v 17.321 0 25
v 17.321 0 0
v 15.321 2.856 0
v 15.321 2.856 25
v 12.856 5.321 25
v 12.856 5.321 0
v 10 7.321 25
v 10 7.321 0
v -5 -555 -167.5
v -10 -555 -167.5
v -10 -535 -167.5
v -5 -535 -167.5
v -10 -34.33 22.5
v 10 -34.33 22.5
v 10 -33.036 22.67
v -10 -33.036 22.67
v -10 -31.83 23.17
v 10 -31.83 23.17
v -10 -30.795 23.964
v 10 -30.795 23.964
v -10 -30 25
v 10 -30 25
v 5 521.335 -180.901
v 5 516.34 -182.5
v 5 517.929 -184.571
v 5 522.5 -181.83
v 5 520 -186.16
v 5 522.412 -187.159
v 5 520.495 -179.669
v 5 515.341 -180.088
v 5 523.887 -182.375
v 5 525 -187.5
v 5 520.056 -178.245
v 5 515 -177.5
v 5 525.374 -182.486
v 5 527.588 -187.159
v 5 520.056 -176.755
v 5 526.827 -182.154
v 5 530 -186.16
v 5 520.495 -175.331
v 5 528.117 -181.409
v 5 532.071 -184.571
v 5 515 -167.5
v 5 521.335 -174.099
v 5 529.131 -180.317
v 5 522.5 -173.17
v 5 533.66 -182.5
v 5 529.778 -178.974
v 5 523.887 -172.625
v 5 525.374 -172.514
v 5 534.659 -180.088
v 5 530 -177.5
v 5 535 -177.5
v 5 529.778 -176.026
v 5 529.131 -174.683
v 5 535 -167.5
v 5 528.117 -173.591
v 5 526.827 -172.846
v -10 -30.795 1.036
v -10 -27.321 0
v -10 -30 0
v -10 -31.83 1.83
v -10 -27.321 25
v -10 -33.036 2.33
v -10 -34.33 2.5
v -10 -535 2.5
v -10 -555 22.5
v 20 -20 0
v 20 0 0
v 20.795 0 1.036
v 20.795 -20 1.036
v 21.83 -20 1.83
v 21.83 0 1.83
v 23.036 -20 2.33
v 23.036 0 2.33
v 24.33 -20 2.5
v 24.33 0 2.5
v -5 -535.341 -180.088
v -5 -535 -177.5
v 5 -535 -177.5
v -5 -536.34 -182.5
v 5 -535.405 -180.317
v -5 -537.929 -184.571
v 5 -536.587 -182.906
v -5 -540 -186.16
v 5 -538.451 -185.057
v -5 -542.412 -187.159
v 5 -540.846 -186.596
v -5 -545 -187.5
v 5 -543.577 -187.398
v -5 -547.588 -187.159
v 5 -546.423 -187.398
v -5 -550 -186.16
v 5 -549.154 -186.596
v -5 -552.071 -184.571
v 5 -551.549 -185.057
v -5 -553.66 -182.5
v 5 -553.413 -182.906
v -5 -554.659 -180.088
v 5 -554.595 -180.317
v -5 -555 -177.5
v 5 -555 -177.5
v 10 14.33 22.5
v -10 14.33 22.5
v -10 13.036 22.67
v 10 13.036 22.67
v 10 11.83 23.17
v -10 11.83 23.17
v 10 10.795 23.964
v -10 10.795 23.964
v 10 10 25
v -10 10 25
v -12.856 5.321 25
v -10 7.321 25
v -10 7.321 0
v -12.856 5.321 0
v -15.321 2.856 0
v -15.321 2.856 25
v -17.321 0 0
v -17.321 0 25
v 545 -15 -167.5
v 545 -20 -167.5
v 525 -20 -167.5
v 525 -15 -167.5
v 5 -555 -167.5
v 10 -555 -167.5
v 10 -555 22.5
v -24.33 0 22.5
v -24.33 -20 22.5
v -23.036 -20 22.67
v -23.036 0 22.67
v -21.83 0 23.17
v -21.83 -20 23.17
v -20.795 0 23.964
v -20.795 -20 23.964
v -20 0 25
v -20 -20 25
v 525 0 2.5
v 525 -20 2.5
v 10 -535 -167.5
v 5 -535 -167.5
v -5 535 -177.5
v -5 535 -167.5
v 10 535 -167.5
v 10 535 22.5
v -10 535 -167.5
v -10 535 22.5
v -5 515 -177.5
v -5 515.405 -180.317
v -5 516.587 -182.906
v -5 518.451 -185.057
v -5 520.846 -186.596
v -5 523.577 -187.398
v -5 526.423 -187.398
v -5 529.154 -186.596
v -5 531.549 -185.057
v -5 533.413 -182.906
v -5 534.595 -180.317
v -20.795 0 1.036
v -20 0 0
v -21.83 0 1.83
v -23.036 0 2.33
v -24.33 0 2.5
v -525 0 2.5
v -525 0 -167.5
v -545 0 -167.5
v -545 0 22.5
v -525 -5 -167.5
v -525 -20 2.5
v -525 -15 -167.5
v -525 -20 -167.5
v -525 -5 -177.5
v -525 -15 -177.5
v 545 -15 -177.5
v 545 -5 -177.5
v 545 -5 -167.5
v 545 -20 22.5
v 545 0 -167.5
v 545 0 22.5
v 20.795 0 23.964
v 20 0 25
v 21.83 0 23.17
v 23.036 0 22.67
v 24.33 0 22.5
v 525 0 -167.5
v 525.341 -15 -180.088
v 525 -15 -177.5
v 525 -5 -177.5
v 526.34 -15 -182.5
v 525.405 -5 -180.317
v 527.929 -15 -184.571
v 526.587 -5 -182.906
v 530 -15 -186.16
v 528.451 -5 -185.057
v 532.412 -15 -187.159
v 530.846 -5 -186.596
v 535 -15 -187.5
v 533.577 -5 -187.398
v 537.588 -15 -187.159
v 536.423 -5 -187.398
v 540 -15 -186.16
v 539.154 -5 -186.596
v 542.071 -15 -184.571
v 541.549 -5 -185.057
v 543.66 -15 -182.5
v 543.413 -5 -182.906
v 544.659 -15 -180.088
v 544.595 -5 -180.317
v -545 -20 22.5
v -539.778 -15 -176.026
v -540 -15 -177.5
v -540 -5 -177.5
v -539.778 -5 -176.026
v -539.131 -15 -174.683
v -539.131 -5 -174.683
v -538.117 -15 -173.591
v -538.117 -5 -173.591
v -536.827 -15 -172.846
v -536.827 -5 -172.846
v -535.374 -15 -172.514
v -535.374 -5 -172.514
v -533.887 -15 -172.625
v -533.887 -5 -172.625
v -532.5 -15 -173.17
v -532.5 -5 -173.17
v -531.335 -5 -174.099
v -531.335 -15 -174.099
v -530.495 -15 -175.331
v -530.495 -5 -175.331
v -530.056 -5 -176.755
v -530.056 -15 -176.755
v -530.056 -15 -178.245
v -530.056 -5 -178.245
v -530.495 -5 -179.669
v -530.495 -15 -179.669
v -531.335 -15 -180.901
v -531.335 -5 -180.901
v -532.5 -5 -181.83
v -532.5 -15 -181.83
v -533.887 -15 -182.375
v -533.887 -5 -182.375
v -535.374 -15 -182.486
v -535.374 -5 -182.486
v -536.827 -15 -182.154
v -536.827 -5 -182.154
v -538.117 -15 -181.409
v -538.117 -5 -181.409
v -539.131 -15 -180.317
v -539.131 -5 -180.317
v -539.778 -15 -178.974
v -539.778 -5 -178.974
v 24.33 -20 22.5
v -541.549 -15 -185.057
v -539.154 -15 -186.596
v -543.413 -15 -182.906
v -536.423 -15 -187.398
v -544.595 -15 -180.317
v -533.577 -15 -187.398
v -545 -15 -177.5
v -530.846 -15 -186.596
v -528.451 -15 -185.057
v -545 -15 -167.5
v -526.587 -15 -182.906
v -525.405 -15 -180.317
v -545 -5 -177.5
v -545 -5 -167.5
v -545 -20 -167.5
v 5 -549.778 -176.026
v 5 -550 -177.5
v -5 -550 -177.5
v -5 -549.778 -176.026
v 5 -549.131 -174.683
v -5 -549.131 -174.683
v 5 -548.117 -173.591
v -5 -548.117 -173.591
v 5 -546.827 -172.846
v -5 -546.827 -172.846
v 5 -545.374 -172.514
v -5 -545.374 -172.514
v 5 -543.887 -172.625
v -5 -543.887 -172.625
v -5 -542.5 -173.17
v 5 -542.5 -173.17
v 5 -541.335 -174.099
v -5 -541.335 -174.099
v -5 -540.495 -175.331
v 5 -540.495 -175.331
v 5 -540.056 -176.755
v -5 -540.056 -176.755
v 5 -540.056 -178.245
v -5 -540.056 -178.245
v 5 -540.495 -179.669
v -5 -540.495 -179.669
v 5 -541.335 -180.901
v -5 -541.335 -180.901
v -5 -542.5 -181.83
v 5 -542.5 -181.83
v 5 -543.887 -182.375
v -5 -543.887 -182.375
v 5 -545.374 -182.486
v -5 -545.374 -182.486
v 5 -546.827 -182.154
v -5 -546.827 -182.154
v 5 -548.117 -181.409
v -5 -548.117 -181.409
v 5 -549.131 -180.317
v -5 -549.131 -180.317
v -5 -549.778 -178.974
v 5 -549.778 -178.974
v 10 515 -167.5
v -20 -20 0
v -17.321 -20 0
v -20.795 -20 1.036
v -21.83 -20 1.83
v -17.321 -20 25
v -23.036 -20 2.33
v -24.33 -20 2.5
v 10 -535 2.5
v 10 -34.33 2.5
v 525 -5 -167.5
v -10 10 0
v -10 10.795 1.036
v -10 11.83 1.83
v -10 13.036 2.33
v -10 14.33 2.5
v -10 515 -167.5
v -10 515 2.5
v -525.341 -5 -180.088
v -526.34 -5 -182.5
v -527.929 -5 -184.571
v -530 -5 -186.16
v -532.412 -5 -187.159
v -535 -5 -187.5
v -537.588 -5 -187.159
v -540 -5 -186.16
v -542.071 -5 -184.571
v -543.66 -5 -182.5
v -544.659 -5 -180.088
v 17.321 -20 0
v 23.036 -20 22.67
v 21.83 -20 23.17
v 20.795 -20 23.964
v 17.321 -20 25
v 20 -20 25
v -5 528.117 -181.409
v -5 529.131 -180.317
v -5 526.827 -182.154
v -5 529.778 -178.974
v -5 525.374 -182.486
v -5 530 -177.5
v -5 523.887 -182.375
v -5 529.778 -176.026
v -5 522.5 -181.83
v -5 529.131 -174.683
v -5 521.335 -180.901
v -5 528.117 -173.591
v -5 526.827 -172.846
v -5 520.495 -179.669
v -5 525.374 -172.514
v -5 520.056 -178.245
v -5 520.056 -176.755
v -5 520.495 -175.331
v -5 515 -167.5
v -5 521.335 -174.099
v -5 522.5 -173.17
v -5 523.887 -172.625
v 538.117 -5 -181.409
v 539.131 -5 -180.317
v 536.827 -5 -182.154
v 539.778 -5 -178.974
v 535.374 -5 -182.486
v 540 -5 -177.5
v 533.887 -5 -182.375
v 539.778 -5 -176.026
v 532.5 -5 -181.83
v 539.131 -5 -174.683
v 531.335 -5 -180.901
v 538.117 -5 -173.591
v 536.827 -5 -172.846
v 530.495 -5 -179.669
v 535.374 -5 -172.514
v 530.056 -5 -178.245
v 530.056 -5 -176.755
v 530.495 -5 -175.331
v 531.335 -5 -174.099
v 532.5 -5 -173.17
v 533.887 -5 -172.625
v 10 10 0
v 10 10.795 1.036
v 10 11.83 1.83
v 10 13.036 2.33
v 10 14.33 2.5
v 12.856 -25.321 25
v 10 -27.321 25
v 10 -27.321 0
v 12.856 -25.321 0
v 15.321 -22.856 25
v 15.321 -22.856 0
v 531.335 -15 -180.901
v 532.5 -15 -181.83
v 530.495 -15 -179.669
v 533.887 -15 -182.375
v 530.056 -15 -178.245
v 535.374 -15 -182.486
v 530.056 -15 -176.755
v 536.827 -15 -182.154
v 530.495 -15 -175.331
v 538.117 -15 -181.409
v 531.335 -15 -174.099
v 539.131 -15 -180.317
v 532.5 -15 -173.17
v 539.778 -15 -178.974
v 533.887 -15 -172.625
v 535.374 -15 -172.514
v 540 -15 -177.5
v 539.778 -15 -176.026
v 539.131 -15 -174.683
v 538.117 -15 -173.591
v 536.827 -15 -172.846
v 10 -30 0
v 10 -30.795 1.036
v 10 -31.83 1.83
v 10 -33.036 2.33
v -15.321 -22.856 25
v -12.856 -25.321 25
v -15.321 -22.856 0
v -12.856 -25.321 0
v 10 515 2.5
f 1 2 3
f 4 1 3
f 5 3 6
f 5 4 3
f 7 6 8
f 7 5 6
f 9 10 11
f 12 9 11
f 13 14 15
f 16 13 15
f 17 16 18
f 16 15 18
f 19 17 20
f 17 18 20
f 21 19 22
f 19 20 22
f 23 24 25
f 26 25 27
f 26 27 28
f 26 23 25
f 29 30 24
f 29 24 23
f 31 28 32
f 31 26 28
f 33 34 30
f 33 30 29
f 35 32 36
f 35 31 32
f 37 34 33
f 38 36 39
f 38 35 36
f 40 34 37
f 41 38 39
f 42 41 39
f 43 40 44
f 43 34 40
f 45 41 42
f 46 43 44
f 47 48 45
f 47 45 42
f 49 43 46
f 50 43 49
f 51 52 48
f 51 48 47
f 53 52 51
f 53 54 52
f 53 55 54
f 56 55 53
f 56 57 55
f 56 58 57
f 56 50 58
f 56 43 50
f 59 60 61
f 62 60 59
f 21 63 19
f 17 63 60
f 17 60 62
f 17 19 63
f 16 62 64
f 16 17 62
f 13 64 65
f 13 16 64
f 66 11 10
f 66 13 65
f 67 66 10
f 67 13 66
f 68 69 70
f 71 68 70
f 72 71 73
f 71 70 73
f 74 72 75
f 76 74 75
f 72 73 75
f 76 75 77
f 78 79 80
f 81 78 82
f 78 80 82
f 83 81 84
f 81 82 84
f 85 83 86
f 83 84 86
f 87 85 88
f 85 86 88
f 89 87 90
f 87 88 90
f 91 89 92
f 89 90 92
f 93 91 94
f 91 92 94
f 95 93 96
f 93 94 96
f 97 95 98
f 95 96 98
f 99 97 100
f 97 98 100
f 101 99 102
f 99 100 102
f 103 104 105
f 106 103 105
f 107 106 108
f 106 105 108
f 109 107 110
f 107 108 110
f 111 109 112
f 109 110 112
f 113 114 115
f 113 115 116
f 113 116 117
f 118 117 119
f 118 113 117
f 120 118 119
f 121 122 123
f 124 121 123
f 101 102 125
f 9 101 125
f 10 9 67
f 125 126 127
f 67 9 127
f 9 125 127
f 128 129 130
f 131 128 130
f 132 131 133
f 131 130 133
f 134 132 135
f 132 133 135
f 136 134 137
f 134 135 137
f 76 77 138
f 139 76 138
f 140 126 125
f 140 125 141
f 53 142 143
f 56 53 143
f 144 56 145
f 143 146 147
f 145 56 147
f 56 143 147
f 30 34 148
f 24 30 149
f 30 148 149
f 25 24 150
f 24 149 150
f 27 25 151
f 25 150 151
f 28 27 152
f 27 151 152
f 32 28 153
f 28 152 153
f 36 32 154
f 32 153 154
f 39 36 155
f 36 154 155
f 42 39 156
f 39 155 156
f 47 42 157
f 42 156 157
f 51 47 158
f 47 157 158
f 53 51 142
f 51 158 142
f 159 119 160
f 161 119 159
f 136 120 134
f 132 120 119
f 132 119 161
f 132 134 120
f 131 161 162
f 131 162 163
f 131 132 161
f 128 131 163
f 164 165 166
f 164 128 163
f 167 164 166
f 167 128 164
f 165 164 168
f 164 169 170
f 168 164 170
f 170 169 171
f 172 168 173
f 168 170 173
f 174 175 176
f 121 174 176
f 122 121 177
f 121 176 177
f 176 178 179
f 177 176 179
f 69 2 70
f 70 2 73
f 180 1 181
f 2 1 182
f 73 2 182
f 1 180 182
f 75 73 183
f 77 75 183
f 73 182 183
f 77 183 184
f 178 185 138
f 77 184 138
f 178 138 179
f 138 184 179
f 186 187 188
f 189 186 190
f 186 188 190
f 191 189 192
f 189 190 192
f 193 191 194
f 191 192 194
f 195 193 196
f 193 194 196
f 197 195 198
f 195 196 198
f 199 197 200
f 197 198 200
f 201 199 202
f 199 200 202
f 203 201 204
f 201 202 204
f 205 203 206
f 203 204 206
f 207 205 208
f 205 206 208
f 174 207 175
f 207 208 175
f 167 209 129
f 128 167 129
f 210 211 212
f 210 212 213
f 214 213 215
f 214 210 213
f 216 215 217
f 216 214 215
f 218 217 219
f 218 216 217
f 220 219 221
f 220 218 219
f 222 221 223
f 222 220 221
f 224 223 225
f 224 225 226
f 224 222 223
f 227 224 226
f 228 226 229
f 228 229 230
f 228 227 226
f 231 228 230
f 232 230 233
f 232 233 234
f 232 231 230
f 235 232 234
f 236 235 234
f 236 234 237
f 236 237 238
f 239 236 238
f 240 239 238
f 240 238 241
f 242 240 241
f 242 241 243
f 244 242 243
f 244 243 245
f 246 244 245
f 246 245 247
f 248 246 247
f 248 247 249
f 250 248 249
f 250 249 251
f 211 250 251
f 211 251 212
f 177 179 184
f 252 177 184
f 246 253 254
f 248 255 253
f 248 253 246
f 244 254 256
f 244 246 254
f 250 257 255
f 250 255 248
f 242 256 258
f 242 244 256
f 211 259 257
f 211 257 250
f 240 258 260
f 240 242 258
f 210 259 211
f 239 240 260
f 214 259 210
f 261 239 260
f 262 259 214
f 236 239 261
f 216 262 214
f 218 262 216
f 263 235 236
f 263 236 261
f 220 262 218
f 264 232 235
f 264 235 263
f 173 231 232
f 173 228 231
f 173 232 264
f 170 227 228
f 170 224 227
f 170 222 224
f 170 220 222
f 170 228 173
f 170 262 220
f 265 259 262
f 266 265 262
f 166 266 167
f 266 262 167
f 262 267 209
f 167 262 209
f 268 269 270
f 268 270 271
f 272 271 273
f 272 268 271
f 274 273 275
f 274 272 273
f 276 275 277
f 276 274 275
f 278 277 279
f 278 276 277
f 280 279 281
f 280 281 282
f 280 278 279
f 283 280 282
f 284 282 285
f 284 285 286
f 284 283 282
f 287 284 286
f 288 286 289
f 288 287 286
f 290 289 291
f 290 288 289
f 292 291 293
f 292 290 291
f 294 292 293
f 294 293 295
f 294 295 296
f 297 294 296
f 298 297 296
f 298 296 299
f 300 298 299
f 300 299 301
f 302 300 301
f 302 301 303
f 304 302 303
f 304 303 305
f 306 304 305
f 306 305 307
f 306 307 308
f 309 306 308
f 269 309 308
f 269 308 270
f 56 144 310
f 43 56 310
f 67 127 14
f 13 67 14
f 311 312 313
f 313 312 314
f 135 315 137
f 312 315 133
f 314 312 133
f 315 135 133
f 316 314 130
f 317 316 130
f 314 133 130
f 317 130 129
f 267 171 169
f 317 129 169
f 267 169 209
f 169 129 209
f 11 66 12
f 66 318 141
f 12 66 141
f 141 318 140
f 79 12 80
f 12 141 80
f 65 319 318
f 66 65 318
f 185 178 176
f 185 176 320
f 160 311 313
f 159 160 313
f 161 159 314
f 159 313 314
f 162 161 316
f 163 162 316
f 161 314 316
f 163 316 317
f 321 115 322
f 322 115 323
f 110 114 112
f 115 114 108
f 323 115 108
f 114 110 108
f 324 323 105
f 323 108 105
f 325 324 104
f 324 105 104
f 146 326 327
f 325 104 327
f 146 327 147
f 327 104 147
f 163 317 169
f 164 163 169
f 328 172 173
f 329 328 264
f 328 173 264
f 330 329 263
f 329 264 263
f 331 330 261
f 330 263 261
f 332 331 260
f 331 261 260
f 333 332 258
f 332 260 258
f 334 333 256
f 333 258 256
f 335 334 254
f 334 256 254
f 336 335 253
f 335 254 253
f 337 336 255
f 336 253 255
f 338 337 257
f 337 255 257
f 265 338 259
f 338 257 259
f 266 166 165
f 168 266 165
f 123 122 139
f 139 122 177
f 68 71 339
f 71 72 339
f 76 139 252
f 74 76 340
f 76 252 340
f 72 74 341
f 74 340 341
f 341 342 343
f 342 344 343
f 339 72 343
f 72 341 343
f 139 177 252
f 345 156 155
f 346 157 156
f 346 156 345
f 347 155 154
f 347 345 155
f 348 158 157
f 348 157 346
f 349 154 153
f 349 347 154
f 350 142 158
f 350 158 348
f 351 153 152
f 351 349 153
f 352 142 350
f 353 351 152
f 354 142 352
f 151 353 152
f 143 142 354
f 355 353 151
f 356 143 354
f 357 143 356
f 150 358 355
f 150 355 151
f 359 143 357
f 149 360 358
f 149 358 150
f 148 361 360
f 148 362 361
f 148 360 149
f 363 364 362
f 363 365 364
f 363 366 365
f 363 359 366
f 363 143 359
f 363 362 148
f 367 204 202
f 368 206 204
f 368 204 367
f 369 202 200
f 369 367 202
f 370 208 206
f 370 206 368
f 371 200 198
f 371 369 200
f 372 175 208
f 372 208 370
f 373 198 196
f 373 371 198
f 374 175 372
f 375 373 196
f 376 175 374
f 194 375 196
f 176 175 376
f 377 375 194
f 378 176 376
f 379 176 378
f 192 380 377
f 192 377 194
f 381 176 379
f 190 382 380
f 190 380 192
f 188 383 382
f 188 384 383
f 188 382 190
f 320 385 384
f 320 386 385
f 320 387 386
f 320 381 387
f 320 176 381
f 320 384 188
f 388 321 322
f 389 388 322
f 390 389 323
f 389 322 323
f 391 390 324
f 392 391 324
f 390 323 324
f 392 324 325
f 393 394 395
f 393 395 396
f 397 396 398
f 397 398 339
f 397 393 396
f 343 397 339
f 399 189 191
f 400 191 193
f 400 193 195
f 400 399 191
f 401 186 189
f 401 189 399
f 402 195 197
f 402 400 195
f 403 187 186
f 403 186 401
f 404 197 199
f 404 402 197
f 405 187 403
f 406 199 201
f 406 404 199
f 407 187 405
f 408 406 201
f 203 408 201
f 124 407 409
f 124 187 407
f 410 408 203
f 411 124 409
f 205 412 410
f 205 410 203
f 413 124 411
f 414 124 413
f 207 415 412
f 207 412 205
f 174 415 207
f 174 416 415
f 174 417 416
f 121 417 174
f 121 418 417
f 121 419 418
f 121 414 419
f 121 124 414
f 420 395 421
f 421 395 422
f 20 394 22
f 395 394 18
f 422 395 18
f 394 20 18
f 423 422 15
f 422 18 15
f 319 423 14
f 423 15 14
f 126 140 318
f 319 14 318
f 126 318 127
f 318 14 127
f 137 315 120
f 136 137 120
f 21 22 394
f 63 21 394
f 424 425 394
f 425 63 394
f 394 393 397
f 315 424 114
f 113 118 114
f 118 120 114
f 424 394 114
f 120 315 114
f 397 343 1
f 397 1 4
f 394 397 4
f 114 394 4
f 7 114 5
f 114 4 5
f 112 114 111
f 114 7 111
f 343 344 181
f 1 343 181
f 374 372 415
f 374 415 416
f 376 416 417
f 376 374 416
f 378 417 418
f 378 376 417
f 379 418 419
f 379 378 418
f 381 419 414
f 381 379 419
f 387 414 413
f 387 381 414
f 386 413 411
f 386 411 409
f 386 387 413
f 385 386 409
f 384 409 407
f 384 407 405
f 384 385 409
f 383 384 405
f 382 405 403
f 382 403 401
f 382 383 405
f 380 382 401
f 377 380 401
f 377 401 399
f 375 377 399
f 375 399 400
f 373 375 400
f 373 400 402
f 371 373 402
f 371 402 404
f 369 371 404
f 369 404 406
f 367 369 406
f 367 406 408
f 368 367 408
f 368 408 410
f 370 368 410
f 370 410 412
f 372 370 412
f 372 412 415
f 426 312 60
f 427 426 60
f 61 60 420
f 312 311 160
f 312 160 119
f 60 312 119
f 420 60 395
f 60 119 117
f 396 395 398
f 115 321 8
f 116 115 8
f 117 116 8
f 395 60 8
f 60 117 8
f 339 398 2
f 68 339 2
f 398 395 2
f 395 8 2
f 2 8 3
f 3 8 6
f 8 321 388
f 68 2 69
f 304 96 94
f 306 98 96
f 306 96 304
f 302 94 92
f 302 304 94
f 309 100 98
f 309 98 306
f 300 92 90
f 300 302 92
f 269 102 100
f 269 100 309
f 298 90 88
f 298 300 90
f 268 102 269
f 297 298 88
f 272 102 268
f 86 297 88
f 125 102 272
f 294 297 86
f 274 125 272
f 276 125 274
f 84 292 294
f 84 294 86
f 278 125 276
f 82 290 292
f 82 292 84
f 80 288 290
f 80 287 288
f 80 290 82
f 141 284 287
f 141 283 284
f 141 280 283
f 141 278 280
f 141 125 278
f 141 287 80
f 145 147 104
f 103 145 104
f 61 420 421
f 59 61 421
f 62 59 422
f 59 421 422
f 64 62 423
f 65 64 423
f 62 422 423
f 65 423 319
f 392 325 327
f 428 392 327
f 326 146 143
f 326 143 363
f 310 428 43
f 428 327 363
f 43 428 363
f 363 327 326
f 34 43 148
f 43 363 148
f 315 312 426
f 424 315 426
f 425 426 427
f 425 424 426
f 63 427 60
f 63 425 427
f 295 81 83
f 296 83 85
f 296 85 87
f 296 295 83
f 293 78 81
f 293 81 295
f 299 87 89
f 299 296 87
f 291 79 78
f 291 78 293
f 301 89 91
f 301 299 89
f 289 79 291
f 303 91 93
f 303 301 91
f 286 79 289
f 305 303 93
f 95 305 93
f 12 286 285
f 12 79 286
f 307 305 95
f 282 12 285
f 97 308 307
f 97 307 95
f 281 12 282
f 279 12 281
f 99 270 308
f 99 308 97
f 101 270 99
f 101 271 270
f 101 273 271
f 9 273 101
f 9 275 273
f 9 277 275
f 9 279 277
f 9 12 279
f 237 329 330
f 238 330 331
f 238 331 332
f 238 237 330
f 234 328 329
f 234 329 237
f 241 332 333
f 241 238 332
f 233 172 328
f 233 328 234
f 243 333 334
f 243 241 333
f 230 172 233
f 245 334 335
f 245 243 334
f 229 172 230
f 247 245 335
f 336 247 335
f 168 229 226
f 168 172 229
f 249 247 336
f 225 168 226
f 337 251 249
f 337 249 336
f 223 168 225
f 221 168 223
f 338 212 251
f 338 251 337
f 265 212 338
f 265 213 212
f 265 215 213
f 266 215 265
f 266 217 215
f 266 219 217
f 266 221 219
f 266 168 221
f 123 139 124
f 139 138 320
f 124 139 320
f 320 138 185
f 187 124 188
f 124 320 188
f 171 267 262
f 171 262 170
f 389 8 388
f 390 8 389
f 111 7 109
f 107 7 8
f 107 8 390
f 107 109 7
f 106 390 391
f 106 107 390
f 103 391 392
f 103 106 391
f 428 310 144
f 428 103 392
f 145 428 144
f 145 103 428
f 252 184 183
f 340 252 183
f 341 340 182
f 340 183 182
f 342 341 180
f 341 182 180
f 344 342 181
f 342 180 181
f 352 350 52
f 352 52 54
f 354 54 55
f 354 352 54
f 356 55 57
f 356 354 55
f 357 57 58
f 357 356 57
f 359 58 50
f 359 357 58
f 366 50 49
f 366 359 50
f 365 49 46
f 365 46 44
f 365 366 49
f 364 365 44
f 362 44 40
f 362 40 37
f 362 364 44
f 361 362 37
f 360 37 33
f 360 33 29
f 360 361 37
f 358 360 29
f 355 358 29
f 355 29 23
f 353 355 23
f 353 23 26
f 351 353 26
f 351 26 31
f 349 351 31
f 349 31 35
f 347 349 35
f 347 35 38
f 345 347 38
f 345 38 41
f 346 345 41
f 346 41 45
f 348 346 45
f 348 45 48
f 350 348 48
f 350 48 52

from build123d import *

# Parameters (mm, degrees)
F0_R            = 5
F1_DEPTH        = 20
F2_T1_DEPTH     = 20
F4_COUNT        = 4
F3_R            = 20
F5_DEPTH        = 25
F6_R            = 5
F7_DEPTH        = 5
F7_COPIES_COUNT = 4
F8_W            = 20
F8_H            = 20
F9_DEPTH        = 5
F9_COPIES_COUNT = 4


# Not quite as in the source:
# - a fillet or chamfer that OpenCascade refuses, or shapes differently, is made with other operations: its cross-section is extruded or revolved along the edge and cut away or added
# - a pattern or mirror of a feature is missing from the dataset's text; its kind, count and spacing are read off the source's solid


with BuildPart() as f1:
    # F0 (on Front) → F1 (new body)
    with BuildSketch(Plane.XZ):
        with BuildLine():
            Line((0, 25), (0, 0))
            Line((0, 0), (20, 0))
            Line((20, 0), (20, 2.5))
            Line((20, 2.5), (525, 2.5))
            Line((525, 2.5), (525, -177.5))
            ThreePointArc((525, -177.5), (535, -187.5), (545, -177.5))
            Line((545, -177.5), (545, 22.5))
            Line((545, 22.5), (20, 22.5))
            Line((20, 22.5), (20, 25))
            Line((20, 25), (0, 25))
        make_face()
        with Locations((535, -177.5)):
            Circle(F0_R, mode=Mode.SUBTRACT)
    extrude(amount=F1_DEPTH)

    # F2: fillet of radius 5 on 2 edges, made by hand

    # F2_s2 → F2_t1 (join)
    with BuildSketch(Plane.XZ):
        with BuildLine():
            ThreePointArc((24.3301270189, 22.5), (21.8301270189, 23.1698729811), (20, 25))
            Line((20, 25), (20, 22.5))
            Line((20, 22.5), (24.3301270189, 22.5))
        make_face()
        with BuildLine():
            ThreePointArc((20, 0), (21.8301270189, 1.8301270189), (24.3301270189, 2.5))
            Line((24.3301270189, 2.5), (20, 2.5))
            Line((20, 2.5), (20, 0))
        make_face()
    extrude(amount=F2_T1_DEPTH)

    # F4: F1 ×4 about axis
    f4_axis = Axis((0, -10, 25), (0, 0, 1))


with BuildPart() as f1_1:
    add(f1.part)
    for i in range(1, F4_COUNT):
        add(f1.part.rotate(f4_axis, i * 360 / F4_COUNT))

    # F3 (on face) → F5 (join, through all)
    with BuildSketch(Plane.XY.offset(25)):
        with Locations((0, -10)):
            Circle(F3_R)
    extrude(amount=-F5_DEPTH)

    # F6 (on face) → F7 (cut)
    with BuildSketch(Plane(origin=(-10, 0, 0), x_dir=(0, -1, 0), z_dir=(-1, 0, 0))):
        with BuildLine():
            Line((555, -177.5), (555, -167.5))
            Line((555, -167.5), (535, -167.5))
            Line((535, -167.5), (535, -177.5))
            ThreePointArc((535, -177.5), (537.9289321881, -184.5710678119), (545, -187.5))
            ThreePointArc((545, -187.5), (552.0710678119, -184.5710678119), (555, -177.5))
        make_face()
        with Locations((545, -177.5)):
            Circle(F6_R, mode=Mode.SUBTRACT)
    f7 = extrude(amount=-F7_DEPTH, mode=Mode.SUBTRACT)

    # F7_copies: F7 ×4 about axis
    f7_copies_axis = Axis((0, -10, 0), (0, 0, 1))
    for i in range(1, F7_COPIES_COUNT):
        add(f7.rotate(f7_copies_axis, i * 360 / F7_COPIES_COUNT), mode=Mode.SUBTRACT)

    # F8 (on face) → F9 (cut)
    with BuildSketch(Plane.YZ.offset(10)):
        with Locations((-545, -177.5)):
            Rectangle(F8_W, F8_H)
    f9 = extrude(amount=-F9_DEPTH, mode=Mode.SUBTRACT)

    # F9_copies: F9 ×4 about axis
    f9_copies_axis = Axis((0, -10, 0), (0, 0, 1))
    for i in range(1, F9_COPIES_COUNT):
        add(f9.rotate(f9_copies_axis, i * 360 / F9_COPIES_COUNT), mode=Mode.SUBTRACT)


solid = f1_1.part
